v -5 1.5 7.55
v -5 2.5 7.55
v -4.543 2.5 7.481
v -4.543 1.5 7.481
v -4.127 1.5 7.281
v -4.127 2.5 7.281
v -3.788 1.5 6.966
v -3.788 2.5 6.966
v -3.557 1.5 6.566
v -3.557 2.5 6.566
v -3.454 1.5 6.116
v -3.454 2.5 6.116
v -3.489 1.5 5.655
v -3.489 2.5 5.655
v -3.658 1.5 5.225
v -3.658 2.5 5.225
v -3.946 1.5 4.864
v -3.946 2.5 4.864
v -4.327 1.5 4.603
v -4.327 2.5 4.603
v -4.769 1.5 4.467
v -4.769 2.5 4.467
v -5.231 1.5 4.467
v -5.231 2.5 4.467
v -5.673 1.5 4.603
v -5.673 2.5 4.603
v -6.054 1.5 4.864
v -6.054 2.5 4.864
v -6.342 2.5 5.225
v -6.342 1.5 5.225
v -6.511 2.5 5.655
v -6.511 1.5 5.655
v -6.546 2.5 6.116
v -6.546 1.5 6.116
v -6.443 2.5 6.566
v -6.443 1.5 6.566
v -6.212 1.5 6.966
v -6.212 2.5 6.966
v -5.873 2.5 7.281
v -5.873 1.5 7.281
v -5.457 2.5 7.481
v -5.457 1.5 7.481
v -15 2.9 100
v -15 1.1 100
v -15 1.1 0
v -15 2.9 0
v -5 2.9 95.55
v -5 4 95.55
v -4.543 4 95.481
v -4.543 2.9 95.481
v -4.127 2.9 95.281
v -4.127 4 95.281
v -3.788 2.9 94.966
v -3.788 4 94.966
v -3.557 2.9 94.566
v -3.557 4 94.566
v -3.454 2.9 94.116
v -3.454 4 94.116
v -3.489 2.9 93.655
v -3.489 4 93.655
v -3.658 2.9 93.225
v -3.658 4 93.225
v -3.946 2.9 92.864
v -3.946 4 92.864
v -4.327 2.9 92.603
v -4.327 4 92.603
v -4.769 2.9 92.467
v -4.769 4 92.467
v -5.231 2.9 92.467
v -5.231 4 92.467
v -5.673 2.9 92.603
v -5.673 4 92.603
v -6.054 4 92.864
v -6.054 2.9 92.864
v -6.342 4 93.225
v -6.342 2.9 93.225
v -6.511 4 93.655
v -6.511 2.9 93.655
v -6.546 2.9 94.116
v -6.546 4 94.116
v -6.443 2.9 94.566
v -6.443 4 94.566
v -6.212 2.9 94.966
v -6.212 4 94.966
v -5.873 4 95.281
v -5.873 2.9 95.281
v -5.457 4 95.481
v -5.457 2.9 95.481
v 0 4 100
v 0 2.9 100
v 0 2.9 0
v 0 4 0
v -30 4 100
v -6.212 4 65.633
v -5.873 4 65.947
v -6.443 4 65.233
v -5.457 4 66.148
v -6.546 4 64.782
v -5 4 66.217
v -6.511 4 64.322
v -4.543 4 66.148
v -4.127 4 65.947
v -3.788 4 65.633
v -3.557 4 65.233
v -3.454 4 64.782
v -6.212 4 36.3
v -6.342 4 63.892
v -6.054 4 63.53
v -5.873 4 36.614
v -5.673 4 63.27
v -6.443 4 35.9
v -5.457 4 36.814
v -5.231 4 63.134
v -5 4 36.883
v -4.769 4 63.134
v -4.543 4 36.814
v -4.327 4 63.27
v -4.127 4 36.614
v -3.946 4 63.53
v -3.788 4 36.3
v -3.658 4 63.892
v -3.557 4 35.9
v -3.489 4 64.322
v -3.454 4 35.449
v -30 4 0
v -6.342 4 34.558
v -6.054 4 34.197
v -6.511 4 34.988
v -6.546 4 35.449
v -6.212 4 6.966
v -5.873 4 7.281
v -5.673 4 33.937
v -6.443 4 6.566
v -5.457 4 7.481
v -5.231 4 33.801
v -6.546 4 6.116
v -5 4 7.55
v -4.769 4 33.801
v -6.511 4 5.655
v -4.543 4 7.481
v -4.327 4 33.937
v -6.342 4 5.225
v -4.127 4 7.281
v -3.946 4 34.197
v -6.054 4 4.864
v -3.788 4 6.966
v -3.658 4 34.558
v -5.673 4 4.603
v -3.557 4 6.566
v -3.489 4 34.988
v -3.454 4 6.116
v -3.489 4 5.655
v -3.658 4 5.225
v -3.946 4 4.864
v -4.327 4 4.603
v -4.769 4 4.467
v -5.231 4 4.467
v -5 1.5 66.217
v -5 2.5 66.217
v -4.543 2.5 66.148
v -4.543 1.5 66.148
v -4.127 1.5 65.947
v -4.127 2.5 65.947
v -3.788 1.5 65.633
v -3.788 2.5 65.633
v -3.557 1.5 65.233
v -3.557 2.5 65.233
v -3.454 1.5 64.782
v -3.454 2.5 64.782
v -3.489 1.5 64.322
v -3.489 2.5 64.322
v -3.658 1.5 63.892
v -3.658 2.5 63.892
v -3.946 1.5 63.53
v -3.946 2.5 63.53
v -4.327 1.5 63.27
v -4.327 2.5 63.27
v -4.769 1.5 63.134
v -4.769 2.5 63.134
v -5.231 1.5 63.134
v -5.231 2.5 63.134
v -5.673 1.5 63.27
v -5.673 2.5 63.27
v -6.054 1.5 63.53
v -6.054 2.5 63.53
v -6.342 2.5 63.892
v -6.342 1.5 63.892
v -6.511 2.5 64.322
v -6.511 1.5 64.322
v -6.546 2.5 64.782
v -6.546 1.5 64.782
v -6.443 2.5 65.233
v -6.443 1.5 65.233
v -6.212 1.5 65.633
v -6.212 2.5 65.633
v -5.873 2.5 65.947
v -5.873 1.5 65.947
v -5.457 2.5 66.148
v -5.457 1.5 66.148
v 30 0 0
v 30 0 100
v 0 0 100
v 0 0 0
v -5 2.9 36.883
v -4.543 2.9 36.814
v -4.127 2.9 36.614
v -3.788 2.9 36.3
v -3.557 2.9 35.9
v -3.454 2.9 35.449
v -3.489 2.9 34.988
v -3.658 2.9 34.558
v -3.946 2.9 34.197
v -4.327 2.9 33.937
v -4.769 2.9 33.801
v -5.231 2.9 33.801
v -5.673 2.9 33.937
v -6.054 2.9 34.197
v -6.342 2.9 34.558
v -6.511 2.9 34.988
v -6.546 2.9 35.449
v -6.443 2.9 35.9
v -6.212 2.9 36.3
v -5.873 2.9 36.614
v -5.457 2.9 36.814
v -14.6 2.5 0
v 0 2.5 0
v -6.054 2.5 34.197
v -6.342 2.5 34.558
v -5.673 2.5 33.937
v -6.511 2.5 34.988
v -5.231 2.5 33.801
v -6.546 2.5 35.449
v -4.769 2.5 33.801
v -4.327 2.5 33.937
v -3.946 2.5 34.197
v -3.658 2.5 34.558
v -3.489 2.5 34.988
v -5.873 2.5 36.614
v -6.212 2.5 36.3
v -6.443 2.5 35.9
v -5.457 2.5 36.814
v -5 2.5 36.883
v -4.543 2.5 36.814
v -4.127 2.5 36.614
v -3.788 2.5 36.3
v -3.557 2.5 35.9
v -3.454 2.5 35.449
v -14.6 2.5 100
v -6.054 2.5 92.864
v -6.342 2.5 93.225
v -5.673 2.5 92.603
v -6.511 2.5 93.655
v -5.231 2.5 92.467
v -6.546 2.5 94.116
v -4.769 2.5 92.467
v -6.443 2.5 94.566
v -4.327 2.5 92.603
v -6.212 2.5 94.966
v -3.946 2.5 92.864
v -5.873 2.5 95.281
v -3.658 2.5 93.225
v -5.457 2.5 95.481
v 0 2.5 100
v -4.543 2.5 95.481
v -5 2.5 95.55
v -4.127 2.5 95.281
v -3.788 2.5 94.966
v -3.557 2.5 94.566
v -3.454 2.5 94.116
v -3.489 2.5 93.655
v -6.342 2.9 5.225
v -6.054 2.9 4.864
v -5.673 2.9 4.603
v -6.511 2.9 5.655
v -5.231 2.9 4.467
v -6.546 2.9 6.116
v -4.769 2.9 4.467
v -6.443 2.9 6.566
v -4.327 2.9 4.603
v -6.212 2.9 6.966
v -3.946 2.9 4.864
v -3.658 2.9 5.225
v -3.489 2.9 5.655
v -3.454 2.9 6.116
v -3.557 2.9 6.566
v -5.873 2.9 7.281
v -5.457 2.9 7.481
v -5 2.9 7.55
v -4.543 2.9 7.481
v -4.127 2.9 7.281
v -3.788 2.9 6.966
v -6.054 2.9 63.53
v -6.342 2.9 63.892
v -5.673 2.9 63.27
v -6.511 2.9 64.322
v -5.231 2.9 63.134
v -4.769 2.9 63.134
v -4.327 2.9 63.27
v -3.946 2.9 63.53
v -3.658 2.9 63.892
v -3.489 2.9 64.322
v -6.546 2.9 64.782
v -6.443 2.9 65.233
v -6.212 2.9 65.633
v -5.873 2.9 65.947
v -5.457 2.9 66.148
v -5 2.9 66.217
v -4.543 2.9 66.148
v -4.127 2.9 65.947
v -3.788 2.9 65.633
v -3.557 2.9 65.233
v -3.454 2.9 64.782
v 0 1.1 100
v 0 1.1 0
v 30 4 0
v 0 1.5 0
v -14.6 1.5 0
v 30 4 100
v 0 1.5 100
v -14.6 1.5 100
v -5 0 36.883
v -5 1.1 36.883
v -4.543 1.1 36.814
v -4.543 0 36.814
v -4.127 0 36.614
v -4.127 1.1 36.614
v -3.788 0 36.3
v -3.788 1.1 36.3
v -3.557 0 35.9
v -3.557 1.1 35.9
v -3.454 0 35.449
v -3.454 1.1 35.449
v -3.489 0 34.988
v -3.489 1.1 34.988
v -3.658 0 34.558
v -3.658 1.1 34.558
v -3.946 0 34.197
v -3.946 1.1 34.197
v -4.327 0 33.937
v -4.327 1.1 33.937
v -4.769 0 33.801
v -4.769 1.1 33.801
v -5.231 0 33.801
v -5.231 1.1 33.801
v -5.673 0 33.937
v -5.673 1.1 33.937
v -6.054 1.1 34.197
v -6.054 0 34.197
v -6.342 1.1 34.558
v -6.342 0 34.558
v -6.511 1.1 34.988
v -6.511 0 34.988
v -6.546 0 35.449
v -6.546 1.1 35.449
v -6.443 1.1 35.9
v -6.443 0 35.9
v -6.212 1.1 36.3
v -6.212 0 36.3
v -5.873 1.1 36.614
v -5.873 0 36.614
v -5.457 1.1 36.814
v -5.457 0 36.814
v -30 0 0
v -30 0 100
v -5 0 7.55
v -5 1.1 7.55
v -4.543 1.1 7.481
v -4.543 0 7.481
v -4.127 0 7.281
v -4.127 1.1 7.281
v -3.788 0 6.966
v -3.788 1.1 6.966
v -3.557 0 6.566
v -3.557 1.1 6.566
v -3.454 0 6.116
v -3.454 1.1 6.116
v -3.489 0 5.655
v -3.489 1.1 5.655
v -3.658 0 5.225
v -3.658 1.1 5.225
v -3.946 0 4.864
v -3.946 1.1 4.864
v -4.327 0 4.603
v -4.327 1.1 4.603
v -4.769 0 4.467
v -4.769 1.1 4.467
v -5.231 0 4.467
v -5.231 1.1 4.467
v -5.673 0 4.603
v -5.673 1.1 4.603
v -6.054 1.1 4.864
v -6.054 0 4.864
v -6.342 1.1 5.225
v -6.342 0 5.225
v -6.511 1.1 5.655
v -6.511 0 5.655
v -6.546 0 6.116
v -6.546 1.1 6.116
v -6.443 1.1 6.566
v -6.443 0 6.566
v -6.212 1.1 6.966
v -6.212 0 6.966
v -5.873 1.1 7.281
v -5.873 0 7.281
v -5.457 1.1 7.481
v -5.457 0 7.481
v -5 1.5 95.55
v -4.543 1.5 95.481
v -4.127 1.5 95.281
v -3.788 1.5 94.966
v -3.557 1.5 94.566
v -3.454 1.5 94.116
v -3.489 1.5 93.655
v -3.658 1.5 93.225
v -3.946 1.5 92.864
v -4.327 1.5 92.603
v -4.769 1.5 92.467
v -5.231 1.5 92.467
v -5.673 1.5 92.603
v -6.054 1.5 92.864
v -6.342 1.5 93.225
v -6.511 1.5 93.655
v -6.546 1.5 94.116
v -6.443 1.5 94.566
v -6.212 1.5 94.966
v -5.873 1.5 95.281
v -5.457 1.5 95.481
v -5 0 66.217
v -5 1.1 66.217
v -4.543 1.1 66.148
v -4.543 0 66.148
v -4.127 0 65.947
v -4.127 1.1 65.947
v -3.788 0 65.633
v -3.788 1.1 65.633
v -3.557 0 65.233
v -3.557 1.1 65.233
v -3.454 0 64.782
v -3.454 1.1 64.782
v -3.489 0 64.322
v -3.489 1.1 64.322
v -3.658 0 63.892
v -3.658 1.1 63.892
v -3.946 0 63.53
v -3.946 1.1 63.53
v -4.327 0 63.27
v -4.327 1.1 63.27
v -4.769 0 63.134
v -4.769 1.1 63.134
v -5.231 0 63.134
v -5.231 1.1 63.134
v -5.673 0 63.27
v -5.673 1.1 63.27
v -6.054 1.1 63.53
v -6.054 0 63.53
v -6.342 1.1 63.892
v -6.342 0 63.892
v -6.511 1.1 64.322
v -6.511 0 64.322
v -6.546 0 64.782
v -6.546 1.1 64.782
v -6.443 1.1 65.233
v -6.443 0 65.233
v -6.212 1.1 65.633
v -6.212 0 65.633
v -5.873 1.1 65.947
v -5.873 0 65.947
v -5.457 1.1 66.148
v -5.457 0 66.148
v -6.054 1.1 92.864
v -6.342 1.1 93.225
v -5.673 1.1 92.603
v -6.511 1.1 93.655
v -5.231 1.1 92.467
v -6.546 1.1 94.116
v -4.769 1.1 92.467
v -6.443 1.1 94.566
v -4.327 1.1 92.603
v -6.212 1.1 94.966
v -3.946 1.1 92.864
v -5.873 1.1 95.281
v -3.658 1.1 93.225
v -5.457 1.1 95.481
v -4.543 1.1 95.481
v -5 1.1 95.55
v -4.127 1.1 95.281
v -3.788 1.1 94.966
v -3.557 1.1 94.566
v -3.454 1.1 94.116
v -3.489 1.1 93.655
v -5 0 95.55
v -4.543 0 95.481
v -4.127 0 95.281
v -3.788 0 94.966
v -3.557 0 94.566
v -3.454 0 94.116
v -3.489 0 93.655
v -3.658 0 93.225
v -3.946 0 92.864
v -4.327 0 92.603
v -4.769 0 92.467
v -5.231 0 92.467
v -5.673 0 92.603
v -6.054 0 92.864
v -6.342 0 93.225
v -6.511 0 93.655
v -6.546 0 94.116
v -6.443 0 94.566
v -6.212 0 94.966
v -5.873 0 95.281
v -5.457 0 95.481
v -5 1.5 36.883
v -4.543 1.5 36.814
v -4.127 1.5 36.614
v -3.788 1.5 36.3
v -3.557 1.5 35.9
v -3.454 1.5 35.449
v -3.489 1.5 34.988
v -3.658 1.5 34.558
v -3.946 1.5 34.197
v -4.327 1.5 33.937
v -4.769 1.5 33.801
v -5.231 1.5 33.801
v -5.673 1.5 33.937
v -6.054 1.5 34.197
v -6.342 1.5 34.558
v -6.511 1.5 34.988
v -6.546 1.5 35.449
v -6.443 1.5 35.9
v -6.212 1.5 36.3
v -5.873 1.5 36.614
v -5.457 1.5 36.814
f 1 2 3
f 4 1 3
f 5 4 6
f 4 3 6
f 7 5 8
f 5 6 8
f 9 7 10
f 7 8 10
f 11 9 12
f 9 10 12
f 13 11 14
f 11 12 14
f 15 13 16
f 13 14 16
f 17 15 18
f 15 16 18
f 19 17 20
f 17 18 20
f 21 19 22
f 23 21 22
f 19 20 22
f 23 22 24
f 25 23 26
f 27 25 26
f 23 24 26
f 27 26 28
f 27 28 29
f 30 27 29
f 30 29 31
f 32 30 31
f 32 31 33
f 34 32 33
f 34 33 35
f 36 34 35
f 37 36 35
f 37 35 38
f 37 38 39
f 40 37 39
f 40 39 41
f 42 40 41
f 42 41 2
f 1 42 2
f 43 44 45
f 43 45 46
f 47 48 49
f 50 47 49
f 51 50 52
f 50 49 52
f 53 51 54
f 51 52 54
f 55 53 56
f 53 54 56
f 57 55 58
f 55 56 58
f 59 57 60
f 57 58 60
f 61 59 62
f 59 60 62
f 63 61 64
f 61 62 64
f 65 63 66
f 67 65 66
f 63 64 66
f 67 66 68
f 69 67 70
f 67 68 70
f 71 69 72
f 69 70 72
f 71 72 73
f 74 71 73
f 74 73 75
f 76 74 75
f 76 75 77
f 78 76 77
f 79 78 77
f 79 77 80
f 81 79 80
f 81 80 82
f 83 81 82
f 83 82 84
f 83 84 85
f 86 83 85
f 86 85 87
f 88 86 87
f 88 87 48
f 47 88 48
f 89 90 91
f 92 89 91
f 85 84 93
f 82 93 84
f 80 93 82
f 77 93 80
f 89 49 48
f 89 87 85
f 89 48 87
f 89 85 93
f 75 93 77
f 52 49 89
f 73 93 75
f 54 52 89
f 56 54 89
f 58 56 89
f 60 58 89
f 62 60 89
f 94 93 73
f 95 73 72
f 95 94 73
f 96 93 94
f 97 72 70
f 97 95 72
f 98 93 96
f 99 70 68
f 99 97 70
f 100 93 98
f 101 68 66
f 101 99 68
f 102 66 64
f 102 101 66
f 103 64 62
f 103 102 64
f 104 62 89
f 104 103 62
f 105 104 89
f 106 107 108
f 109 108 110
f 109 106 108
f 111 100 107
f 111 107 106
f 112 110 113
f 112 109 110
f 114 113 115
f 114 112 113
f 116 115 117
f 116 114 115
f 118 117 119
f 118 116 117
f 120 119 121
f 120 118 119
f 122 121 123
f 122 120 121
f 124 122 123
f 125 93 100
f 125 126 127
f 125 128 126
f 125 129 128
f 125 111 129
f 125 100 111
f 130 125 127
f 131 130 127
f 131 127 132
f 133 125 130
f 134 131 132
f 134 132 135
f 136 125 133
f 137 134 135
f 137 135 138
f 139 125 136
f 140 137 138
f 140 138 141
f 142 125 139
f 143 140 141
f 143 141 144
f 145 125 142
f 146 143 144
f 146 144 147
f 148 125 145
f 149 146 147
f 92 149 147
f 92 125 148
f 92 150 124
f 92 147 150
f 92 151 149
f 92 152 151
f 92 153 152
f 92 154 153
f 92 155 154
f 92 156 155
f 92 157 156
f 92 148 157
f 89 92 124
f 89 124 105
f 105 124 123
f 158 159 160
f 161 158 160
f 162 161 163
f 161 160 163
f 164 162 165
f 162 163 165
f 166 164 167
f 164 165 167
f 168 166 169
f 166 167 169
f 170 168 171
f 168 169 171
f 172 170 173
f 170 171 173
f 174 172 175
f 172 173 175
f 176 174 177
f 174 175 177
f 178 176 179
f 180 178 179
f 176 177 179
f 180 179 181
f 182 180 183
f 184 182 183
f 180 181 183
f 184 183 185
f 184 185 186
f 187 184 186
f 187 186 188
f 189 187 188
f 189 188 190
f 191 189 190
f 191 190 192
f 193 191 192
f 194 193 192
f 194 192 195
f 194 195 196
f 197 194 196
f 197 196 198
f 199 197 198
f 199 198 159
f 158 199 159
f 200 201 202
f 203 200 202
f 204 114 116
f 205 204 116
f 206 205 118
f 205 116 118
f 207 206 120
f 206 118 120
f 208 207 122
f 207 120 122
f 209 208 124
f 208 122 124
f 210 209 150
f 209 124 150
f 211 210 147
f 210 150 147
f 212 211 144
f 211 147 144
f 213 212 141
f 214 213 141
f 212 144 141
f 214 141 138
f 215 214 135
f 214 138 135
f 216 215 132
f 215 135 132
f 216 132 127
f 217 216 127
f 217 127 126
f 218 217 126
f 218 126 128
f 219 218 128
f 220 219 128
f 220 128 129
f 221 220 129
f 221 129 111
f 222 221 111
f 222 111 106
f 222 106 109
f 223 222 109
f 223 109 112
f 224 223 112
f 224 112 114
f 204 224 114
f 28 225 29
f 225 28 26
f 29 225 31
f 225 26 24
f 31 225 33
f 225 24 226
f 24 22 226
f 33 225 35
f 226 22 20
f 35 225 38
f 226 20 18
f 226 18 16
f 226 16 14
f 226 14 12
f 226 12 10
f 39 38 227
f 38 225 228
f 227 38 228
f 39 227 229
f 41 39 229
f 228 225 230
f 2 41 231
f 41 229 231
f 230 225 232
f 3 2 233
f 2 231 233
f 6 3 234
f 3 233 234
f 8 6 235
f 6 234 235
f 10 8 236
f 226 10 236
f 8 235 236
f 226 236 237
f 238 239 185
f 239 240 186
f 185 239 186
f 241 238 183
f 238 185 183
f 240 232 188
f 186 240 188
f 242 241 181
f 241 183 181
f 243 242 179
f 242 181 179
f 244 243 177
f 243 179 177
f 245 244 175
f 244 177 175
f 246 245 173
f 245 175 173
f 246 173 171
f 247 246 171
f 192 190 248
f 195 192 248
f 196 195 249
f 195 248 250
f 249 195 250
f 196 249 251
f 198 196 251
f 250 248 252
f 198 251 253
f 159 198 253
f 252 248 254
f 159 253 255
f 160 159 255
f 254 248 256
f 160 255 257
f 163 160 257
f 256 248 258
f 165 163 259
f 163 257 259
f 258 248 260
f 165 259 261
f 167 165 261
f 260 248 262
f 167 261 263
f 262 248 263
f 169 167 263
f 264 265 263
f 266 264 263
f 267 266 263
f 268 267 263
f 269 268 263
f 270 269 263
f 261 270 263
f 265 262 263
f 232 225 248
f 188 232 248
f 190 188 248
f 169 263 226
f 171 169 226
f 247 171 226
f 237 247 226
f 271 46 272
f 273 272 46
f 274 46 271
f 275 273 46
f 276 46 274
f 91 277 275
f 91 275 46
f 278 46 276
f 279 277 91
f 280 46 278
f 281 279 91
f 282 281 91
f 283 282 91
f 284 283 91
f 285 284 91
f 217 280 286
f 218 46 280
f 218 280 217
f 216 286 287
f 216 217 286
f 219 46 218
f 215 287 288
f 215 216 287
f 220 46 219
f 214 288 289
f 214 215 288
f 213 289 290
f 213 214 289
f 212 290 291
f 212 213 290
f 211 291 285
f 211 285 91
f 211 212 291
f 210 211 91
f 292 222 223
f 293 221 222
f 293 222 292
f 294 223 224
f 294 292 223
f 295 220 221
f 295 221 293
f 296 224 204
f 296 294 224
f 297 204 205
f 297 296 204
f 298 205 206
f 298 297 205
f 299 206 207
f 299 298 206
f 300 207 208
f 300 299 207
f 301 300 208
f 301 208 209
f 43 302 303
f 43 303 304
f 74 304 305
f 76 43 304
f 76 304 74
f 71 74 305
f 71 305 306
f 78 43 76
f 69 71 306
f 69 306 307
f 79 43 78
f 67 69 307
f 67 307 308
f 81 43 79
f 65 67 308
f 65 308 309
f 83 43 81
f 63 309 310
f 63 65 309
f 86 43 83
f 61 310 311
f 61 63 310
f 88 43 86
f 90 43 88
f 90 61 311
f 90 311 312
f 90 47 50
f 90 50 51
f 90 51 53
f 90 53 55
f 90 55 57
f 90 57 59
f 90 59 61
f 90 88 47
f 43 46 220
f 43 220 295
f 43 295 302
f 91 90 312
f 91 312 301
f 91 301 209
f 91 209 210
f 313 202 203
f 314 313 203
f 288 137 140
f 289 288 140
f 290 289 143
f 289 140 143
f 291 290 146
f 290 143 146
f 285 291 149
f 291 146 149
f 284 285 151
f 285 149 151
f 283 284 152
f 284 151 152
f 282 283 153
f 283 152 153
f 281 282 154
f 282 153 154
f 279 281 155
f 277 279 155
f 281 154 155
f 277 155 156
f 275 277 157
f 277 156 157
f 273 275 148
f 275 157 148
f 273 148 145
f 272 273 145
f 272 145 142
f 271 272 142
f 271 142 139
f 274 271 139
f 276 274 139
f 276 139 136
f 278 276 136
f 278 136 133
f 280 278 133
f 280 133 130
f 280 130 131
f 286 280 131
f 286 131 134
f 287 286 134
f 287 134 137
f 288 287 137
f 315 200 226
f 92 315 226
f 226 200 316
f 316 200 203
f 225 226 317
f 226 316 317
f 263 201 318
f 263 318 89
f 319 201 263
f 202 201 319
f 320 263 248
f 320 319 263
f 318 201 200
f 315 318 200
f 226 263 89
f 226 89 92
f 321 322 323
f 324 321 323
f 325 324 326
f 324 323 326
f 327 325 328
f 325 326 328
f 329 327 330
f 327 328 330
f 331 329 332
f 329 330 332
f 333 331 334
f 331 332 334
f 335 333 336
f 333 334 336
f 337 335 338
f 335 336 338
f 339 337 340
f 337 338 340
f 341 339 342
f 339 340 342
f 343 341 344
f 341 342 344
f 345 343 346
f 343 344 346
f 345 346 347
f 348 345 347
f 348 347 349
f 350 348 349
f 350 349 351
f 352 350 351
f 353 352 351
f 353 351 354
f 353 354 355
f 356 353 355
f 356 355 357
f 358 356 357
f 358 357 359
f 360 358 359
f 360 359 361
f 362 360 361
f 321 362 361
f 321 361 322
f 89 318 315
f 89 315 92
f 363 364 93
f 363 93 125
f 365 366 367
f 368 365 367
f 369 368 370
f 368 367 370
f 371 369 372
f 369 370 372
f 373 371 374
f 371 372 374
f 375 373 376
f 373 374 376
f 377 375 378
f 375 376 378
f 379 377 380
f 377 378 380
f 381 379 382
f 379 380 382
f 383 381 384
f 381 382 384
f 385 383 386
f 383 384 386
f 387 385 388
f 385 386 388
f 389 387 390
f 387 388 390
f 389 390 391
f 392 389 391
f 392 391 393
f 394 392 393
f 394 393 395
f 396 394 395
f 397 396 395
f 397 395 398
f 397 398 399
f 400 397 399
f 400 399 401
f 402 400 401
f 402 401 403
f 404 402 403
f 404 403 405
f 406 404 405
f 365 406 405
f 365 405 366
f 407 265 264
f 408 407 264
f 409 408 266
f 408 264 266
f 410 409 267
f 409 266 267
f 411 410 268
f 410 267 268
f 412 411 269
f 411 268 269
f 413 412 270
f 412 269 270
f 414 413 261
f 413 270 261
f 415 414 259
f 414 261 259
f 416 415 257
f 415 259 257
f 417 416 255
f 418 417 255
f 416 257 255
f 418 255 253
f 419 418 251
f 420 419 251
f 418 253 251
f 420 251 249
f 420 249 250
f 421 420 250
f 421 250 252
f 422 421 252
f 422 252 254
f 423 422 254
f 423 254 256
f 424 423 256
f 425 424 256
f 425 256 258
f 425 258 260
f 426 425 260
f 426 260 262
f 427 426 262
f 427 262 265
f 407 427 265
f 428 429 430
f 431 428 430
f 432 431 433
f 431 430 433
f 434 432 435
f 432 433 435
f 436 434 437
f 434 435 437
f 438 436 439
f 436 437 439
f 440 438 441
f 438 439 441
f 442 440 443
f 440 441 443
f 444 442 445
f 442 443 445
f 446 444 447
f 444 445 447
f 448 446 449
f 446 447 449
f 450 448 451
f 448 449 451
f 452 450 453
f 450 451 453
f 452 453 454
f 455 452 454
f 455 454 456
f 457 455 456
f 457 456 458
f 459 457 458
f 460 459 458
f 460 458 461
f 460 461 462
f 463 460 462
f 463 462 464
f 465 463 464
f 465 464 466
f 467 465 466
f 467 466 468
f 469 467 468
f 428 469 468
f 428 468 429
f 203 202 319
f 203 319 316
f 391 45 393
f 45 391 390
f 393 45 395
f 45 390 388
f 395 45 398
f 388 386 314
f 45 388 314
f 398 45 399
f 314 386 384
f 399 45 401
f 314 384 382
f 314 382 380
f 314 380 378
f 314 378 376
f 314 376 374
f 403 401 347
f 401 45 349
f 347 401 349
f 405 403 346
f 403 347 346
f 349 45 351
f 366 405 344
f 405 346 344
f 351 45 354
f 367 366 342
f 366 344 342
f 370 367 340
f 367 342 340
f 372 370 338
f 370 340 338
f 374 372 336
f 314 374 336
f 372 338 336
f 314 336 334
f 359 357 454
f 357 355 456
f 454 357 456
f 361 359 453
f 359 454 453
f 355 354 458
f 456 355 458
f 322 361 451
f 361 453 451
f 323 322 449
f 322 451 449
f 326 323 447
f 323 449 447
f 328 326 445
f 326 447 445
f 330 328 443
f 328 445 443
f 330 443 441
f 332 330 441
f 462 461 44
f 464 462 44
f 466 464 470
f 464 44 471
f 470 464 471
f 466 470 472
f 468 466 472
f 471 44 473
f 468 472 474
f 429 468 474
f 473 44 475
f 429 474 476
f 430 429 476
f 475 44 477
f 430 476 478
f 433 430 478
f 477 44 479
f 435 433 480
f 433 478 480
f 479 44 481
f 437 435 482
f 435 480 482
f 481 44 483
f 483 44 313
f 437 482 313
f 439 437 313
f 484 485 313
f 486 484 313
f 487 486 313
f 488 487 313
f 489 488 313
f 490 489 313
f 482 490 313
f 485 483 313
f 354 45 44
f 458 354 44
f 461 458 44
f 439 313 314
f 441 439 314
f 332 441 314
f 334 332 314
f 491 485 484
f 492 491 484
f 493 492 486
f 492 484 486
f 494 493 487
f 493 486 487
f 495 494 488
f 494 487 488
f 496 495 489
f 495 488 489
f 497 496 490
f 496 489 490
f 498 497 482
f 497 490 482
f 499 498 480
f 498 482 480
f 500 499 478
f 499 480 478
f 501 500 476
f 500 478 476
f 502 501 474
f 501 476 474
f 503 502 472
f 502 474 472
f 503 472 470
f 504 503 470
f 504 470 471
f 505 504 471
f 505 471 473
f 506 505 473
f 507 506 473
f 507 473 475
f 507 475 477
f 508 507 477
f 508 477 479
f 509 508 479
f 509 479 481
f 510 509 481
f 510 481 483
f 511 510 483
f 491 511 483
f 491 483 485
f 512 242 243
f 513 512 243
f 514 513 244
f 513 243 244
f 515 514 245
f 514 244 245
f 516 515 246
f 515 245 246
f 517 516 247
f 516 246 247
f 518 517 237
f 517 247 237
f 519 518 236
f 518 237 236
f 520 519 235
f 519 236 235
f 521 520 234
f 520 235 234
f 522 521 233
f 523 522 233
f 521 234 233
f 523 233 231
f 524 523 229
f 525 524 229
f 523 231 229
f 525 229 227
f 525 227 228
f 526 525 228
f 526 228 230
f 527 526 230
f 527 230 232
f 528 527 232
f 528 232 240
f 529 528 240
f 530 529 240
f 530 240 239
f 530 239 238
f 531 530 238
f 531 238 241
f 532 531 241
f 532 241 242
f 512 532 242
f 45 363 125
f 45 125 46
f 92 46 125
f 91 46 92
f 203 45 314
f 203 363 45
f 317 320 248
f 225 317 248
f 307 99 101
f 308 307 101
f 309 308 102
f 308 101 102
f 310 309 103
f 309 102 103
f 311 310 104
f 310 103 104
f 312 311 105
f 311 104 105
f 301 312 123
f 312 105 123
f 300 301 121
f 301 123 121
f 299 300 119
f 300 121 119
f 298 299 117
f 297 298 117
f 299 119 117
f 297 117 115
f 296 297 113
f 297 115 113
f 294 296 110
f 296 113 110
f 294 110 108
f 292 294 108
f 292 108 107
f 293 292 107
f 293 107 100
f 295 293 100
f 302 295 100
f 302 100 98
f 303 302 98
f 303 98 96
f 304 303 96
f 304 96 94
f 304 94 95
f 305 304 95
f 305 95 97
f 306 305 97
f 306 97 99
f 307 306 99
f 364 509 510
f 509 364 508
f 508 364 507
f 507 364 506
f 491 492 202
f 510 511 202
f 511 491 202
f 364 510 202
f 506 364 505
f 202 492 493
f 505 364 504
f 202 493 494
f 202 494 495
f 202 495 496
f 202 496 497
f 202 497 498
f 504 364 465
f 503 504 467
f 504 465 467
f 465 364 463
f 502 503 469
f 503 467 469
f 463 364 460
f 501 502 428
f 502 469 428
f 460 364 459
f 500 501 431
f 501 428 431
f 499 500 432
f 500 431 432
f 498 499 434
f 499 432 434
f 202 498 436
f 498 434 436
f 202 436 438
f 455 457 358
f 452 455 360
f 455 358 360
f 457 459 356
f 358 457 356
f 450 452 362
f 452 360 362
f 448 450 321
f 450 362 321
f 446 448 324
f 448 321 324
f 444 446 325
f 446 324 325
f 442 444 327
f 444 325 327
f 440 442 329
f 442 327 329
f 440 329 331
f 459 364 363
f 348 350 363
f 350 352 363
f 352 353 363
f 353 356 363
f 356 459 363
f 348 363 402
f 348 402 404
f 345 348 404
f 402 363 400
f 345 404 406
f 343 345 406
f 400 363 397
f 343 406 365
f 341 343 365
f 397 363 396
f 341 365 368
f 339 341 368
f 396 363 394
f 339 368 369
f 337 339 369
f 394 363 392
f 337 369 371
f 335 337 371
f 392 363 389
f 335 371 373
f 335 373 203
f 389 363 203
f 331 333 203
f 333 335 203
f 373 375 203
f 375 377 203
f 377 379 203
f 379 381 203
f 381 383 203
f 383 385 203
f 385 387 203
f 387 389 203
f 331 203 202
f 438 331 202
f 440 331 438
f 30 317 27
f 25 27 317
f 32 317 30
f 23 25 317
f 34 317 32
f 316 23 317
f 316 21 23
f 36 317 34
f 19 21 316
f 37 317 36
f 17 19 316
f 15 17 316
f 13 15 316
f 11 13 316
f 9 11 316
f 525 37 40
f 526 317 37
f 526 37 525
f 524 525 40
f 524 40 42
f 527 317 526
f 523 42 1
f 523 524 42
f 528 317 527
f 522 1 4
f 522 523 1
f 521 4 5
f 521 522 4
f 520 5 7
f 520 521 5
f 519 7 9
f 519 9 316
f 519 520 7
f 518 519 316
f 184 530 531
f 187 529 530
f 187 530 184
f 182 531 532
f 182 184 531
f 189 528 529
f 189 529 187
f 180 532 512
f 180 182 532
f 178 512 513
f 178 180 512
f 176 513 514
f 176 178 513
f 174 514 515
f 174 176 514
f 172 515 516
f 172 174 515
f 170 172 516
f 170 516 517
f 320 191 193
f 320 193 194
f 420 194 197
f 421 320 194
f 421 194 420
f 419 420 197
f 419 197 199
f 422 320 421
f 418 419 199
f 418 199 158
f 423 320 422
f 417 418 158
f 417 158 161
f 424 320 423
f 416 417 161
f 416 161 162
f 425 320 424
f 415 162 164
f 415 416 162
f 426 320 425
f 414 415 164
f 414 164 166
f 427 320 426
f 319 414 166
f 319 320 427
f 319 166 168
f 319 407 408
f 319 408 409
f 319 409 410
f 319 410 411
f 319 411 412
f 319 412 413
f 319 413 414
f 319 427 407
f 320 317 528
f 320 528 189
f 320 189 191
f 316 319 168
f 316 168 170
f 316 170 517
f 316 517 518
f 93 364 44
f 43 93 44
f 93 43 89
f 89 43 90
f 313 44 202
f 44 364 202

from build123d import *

# Parameters (mm, degrees)
SKETCH1_W           = 30
SKETCH1_H           = 100
BOSS_EXTRUDE1_DEPTH = 4
SKETCH3_W           = 15
SKETCH3_H           = 1.8
CUT_EXTRUDE1_DEPTH  = 100
SKETCH5_W           = 14.6
SKETCH5_H           = 1
BOSS_EXTRUDE3_DEPTH = 100
SKETCH6_R           = 1.55
CUT_EXTRUDE2_DEPTH  = 4


with BuildPart() as part:
    # Sketch1 → Boss-Extrude1 (new body)
    with BuildSketch(Plane(origin=(0, 0, 0), x_dir=(1, 0, 0), z_dir=(0, 1, 0))):
        with Locations((-15, -50)):
            Rectangle(SKETCH1_W, SKETCH1_H)
    extrude(amount=BOSS_EXTRUDE1_DEPTH)


with BuildPart() as body_2:
    # Mirror1: mirrored copy
    add(part.part.mirror(Plane(origin=(0, 4, 0), x_dir=(0, 0, 1), z_dir=(-1, 0, 0))))

    # Sketch5 → Boss-Extrude3 (add)
    with BuildSketch(Plane.XY.offset(100)):
        with Locations((-7.3, 2)):
            Rectangle(SKETCH5_W, SKETCH5_H)
    extrude(amount=-BOSS_EXTRUDE3_DEPTH)


with BuildPart() as part_1:
    add(part.part)

    # Sketch3 → Cut-Extrude1 (cut)
    with BuildSketch(Plane.XY.offset(100)):
        with Locations((-7.5, 2)):
            Rectangle(SKETCH3_W, SKETCH3_H)
    extrude(amount=-CUT_EXTRUDE1_DEPTH, mode=Mode.SUBTRACT)


with BuildPart() as cut_extrude2_tool:
    # Sketch6 → Cut-Extrude2 (new body)
    with BuildSketch(Plane(origin=(0, 4, 0), x_dir=(1, 0, 0), z_dir=(0, 1, 0))):
        with Locations(Location((-5, -6, 0), (0, 0, 270))):
            Circle(SKETCH6_R)
        with Locations(Location((-5, -35.333333333, 0), (0, 0, 270))):
            Circle(SKETCH6_R)
        with Locations(Location((-5, -94, 0), (0, 0, 270))):
            Circle(SKETCH6_R)
        with Locations(Location((-5, -64.666666667, 0), (0, 0, 270))):
            Circle(SKETCH6_R)
    extrude(amount=-CUT_EXTRUDE2_DEPTH)


with BuildPart() as part_2:
    add(part_1.part)

    # Cut-Extrude2: cut by cut_extrude2_tool
    add(cut_extrude2_tool.part, mode=Mode.SUBTRACT)


with BuildPart() as body_2_1:
    add(body_2.part)

    # Cut-Extrude2: cut by cut_extrude2_tool
    add(cut_extrude2_tool.part, mode=Mode.SUBTRACT)


solid = Compound([part_2.part, body_2_1.part])
